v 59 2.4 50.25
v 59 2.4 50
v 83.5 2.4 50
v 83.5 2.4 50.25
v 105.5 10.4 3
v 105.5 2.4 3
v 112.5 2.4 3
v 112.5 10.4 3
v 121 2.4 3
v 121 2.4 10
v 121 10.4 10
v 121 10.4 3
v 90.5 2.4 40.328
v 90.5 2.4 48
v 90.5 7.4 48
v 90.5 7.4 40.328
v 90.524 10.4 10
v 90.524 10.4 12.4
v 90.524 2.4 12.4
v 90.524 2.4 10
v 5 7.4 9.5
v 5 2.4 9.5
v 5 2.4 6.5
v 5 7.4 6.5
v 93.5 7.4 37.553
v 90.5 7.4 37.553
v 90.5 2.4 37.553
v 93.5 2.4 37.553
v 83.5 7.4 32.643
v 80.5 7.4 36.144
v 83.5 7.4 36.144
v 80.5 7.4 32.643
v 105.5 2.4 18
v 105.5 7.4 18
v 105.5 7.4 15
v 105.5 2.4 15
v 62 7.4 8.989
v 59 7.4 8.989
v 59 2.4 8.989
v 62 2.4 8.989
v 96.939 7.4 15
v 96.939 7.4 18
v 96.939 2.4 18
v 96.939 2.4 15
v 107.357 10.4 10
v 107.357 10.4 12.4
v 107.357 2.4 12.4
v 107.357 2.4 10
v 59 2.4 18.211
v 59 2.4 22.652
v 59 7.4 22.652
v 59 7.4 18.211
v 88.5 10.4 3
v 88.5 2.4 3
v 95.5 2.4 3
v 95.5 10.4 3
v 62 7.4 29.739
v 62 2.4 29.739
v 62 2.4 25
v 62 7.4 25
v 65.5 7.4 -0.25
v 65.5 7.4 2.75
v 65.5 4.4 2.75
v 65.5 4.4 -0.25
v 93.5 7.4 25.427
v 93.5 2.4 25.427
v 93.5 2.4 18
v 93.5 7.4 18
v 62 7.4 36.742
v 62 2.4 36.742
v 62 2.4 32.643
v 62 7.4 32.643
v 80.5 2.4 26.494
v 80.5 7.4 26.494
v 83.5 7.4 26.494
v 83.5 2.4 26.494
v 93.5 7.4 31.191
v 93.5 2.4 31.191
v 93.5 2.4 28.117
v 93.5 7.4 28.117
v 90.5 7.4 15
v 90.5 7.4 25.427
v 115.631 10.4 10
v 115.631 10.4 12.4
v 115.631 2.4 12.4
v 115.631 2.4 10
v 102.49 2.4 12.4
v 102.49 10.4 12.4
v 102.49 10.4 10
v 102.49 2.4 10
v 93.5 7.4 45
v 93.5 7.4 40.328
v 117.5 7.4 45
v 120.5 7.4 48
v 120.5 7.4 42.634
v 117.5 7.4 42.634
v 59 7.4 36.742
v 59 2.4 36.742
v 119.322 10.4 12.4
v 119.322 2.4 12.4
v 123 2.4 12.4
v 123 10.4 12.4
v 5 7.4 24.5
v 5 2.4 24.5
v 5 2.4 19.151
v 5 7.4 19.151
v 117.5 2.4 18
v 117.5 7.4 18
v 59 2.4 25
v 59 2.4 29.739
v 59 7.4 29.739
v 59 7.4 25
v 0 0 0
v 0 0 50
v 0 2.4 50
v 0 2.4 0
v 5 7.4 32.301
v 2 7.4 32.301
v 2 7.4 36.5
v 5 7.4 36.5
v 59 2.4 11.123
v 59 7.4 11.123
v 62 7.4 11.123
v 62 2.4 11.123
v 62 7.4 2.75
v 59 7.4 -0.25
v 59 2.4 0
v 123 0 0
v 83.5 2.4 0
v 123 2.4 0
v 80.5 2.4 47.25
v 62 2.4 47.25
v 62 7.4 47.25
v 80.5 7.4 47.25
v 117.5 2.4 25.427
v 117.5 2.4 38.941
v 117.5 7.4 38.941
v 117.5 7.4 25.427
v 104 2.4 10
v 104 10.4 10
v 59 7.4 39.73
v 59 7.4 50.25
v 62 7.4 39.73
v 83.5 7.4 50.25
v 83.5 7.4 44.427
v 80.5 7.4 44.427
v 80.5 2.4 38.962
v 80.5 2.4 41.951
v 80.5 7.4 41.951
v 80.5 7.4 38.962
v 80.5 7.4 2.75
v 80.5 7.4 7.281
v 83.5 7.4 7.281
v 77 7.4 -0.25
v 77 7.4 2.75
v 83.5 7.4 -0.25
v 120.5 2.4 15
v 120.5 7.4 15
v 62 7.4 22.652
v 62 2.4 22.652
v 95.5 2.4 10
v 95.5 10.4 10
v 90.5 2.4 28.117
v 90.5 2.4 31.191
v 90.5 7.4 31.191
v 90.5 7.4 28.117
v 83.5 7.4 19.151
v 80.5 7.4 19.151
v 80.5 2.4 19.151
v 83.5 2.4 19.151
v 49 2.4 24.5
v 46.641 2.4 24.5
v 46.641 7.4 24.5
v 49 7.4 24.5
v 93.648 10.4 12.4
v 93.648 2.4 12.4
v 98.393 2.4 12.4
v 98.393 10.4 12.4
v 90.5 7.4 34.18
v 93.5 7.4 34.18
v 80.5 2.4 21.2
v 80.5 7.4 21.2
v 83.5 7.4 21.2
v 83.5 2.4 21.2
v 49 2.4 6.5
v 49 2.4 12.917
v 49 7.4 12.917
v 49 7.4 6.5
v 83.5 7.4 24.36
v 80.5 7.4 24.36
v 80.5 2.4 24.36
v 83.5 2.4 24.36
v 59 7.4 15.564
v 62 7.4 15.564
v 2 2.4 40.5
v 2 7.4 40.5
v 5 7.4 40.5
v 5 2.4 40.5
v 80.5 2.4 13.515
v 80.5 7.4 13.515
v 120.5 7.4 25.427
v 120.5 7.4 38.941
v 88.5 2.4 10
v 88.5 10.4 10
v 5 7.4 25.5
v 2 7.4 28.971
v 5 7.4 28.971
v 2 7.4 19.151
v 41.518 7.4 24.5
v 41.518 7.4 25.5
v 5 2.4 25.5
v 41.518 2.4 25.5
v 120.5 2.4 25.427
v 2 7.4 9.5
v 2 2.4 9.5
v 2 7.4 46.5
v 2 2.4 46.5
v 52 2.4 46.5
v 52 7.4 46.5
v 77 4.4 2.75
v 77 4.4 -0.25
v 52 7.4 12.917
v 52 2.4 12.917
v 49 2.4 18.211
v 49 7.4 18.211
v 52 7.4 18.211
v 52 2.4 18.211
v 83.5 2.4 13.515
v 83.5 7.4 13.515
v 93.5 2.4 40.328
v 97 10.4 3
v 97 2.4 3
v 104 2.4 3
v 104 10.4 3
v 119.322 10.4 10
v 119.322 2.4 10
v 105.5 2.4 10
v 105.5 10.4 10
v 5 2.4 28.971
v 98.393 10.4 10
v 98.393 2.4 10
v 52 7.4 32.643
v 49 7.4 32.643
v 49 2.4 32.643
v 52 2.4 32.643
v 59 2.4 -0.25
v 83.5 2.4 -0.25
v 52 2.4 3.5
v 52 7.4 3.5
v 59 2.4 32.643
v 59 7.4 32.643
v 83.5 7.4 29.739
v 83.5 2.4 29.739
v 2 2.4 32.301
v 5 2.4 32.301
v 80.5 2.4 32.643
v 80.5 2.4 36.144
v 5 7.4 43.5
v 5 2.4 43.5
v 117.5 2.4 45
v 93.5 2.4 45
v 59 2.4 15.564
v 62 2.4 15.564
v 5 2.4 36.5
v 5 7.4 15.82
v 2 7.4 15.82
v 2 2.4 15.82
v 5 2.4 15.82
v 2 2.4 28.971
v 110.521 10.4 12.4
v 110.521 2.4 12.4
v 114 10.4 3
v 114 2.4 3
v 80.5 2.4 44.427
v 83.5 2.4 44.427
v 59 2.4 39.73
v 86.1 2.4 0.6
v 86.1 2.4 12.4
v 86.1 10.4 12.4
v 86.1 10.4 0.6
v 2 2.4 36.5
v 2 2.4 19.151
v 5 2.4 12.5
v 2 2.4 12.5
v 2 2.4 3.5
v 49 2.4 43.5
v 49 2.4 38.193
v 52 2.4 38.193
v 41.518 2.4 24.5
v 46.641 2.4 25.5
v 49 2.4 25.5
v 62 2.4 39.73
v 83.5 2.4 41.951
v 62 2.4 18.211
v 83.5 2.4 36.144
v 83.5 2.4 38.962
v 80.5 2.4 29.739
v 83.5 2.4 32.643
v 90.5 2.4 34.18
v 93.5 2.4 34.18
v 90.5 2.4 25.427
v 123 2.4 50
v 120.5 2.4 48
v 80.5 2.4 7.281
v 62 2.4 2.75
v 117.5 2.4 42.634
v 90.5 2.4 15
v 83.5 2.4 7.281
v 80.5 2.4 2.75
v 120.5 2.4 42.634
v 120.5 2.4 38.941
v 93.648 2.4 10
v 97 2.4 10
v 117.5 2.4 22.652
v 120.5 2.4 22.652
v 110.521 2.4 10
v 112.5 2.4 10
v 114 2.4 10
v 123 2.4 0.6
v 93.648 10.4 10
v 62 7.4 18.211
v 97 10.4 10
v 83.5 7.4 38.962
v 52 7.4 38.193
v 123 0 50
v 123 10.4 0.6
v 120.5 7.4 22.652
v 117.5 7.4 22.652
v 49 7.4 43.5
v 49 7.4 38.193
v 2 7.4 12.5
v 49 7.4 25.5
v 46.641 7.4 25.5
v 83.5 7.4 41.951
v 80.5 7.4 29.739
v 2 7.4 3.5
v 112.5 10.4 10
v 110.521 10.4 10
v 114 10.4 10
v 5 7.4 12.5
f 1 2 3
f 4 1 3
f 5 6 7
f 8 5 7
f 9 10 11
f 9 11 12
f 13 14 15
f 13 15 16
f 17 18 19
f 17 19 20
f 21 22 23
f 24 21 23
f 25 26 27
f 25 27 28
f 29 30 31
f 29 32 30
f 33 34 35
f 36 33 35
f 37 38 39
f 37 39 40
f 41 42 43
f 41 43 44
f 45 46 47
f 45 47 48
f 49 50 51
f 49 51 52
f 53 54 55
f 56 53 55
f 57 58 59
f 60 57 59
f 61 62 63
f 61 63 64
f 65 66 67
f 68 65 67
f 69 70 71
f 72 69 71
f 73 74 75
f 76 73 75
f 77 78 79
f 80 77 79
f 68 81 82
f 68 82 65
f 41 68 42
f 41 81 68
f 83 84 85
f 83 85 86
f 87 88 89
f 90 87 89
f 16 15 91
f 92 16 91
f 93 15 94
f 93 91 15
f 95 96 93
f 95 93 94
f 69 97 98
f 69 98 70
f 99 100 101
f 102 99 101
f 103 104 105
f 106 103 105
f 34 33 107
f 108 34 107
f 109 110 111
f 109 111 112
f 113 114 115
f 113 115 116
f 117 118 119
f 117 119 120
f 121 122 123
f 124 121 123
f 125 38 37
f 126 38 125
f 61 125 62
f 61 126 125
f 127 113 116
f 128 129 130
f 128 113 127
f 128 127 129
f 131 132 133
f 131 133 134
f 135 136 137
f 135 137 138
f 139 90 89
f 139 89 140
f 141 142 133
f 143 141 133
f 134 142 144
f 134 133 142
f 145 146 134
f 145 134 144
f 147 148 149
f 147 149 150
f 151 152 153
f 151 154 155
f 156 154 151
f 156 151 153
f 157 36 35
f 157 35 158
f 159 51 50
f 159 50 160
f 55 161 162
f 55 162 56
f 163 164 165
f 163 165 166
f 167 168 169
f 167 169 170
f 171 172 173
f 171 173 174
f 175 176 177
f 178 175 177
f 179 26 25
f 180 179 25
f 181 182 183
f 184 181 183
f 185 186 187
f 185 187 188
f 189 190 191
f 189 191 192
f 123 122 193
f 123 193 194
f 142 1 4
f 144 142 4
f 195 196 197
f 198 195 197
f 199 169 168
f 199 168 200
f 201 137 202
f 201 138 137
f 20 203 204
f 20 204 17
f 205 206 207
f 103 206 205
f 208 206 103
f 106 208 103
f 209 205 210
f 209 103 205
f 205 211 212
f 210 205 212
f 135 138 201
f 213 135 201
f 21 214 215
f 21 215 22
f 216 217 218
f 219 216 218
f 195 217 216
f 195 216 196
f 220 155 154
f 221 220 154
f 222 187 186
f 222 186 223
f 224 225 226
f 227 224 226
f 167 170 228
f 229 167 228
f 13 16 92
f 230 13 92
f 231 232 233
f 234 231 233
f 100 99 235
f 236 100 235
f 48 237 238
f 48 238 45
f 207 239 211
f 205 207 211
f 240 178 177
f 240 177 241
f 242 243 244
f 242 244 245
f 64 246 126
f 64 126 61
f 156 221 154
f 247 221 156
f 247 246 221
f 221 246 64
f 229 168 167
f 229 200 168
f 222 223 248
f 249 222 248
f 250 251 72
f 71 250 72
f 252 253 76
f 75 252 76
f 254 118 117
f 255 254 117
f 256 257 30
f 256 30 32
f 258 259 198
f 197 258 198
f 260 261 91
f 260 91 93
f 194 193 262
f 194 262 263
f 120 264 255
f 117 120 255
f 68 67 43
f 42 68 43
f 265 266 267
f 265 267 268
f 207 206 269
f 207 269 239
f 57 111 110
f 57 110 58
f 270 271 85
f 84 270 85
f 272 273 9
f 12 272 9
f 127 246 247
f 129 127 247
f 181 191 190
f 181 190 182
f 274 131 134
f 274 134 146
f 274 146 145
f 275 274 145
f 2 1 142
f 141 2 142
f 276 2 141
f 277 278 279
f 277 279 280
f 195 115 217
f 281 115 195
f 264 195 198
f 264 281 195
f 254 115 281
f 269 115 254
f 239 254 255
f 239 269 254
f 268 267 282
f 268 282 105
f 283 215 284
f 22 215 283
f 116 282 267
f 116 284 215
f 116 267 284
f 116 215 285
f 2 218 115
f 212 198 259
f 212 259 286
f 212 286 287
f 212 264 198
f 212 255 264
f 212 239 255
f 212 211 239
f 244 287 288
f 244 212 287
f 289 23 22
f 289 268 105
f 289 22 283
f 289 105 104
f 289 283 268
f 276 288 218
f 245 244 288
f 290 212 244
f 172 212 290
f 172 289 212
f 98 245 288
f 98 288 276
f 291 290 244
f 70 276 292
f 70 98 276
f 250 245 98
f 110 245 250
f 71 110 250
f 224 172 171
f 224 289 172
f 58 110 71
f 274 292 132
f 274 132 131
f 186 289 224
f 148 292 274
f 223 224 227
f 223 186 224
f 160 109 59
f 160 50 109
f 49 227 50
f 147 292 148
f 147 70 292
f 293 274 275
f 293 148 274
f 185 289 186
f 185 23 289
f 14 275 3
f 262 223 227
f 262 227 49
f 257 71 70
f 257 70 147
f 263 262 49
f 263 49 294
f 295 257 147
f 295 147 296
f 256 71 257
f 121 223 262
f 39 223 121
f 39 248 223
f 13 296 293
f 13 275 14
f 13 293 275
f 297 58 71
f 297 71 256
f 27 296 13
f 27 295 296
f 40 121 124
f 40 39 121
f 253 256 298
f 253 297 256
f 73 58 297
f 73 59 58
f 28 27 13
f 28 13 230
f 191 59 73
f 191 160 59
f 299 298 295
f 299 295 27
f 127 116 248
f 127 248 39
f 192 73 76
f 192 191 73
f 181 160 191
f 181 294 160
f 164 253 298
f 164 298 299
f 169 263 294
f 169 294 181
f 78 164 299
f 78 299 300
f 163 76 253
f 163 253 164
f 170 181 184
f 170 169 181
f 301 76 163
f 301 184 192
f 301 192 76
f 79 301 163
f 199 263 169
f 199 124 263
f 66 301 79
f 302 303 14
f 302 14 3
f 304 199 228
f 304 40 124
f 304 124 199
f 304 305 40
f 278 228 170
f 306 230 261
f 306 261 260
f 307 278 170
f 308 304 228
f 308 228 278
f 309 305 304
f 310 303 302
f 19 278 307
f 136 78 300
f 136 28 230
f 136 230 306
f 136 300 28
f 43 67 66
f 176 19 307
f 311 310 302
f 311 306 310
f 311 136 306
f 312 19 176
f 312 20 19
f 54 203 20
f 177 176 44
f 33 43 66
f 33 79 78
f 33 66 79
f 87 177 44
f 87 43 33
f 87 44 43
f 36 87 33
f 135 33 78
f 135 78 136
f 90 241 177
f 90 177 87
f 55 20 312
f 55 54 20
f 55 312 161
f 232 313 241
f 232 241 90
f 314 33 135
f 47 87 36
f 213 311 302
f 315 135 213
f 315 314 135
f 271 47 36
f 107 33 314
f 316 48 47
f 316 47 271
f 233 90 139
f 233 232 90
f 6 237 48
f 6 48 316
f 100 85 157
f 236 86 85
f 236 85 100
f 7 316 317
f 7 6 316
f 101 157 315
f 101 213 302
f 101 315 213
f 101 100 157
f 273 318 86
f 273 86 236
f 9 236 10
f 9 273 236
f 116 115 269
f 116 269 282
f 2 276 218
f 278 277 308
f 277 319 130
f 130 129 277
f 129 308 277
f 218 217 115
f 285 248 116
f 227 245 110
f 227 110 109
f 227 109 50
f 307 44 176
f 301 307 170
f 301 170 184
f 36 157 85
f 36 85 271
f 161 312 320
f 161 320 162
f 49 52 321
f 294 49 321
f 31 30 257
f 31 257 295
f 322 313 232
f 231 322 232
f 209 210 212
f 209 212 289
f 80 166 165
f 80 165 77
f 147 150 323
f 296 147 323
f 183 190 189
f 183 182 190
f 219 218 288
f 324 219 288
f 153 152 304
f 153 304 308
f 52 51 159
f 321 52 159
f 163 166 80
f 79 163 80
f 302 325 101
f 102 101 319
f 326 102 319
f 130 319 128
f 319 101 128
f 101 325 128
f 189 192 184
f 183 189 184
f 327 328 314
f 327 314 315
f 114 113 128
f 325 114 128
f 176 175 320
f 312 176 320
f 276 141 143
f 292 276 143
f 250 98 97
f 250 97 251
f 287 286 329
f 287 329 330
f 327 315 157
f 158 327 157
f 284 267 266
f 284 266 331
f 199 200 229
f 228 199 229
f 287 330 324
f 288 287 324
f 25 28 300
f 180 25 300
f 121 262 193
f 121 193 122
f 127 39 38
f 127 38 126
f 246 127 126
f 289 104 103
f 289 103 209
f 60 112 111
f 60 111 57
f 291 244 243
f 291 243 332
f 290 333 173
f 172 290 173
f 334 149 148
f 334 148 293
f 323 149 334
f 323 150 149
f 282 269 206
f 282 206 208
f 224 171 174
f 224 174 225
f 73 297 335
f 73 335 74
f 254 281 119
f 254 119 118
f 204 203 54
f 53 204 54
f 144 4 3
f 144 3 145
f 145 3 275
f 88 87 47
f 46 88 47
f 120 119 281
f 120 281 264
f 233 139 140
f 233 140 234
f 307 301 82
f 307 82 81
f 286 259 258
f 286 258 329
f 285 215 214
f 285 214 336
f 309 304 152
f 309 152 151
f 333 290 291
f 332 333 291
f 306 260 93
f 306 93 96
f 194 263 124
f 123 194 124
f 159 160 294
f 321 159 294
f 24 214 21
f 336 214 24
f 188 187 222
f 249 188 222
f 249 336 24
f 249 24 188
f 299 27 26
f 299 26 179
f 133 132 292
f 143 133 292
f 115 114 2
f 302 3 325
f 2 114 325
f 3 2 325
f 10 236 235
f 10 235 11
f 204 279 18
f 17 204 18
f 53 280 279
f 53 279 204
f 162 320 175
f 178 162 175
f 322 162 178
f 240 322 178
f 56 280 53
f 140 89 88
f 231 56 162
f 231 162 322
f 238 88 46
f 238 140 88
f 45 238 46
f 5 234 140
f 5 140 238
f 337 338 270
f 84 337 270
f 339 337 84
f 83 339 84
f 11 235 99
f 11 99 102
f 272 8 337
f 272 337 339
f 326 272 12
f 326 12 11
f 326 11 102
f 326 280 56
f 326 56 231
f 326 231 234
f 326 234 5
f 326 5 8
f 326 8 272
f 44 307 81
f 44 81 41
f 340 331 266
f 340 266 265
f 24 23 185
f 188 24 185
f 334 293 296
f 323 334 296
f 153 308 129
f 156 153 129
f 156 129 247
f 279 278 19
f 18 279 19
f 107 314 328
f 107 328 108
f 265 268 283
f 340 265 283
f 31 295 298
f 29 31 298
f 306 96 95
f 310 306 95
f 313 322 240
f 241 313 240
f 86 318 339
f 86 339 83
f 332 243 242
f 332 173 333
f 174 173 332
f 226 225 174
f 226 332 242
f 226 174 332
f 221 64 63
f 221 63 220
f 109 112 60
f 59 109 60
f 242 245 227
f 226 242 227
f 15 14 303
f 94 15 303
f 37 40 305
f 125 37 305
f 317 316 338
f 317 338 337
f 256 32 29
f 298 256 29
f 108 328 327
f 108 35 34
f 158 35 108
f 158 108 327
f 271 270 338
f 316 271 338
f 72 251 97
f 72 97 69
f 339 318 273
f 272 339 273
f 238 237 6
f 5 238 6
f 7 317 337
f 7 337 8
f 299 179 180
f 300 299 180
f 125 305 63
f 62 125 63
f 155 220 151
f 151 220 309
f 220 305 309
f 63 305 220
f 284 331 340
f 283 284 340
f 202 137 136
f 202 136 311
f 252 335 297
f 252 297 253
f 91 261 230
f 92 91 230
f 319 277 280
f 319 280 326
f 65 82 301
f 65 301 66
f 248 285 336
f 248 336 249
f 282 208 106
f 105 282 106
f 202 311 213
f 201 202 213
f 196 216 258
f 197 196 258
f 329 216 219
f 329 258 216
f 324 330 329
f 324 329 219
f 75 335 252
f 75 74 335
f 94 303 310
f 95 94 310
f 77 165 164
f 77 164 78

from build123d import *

# Parameters (mm, degrees)
SKETCH1_W           = 123
SKETCH1_H           = 50
BOSS_EXTRUDE1_DEPTH = 2.4
SKETCH2_W           = 50
SKETCH2_H           = 43
SKETCH2_W_2         = 44
SKETCH2_H_2         = 18
BOSS_EXTRUDE2_DEPTH = 5
SKETCH3_W           = 24.5
SKETCH3_H           = 50.5
SKETCH3_W_2         = 18.5
SKETCH3_H_2         = 44.5
BOSS_EXTRUDE3_DEPTH = 5
SKETCH4_W           = 11.5
SKETCH4_H           = 3
CUT_EXTRUDE2_DEPTH  = 3
SKETCH5_W           = 30
SKETCH5_H           = 33
SKETCH5_W_2         = 24
SKETCH5_H_2         = 27
BOSS_EXTRUDE5_DEPTH = 5
SKETCH6_W           = 36.9
SKETCH6_H           = 11.8
SKETCH6_W_2         = 7
SKETCH6_H_2         = 7
BOSS_EXTRUDE6_DEPTH = 8
SKETCH7_W           = 5.123641681
SKETCH7_H           = 1
CUT_EXTRUDE3_DEPTH  = 5
SKETCH8_W           = 3
SKETCH8_H           = 5.294429738
SKETCH8_H_2         = 5.550611822
SKETCH8_H_3         = 2.134850701
SKETCH8_H_4         = 2.647214869
SKETCH8_H_5         = 2.348335771
SKETCH8_H_6         = 2.903396953
SKETCH8_H_7         = 2.988790981
SKETCH8_H_8         = 6.233764046
SKETCH8_H_9         = 2.049456673
SKETCH8_H_10        = 2.1348507
SKETCH8_H_11        = 2.818002924
SKETCH8_H_12        = 2.476426813
SKETCH8_H_13        = 2.689911883
SKETCH8_H_14        = 2.775305911
SKETCH8_H_15        = 3.693291713
SKETCH8_W_2         = 8.561478369
SKETCH8_H_16        = 3
CUT_EXTRUDE4_DEPTH  = 5
SKETCH9_W           = 3.123120747
SKETCH9_H           = 2.4
SKETCH9_W_2         = 4.09656098
SKETCH9_W_3         = 3.163680757
SKETCH9_W_4         = 3.690960883
CUT_EXTRUDE5_DEPTH  = 8
SKETCH10_W          = 3
SKETCH10_H          = 3
SKETCH10_H_2        = 3.330367093
SKETCH10_H_3        = 4
CUT_EXTRUDE6_DEPTH  = 5


with BuildPart() as part:
    # Sketch1 → Boss-Extrude1 (new body)
    with BuildSketch(Plane(origin=(0, 0, 0), x_dir=(1, 0, 0), z_dir=(0, 1, 0))):
        with Locations((61.5, -25)):
            Rectangle(SKETCH1_W, SKETCH1_H)
    extrude(amount=BOSS_EXTRUDE1_DEPTH)

    # Sketch2 → Boss-Extrude2 (add)
    with BuildSketch(Plane(origin=(0, 2.4, 0), x_dir=(1, 0, 0), z_dir=(0, 1, 0))):
        with Locations((27, -25)):
            Rectangle(SKETCH2_W, SKETCH2_H)
        with Locations((27, -15.5)):
            Rectangle(SKETCH2_W_2, SKETCH2_H_2, mode=Mode.SUBTRACT)
        with Locations((27, -34.5)):
            Rectangle(SKETCH2_W_2, SKETCH2_H_2, mode=Mode.SUBTRACT)
    extrude(amount=BOSS_EXTRUDE2_DEPTH)

    # Sketch3 → Boss-Extrude3 (add)
    with BuildSketch(Plane(origin=(0, 2.4, 0), x_dir=(1, 0, 0), z_dir=(0, 1, 0))):
        with Locations((71.25, -25)):
            Rectangle(SKETCH3_W, SKETCH3_H)
        with Locations((71.25, -25)):
            Rectangle(SKETCH3_W_2, SKETCH3_H_2, mode=Mode.SUBTRACT)
    extrude(amount=BOSS_EXTRUDE3_DEPTH)

    # Sketch4 → Cut-Extrude2 (cut)
    with BuildSketch(Plane(origin=(0, 7.4, 0), x_dir=(1, 0, 0), z_dir=(0, 1, 0))):
        with Locations((71.25, -1.25)):
            Rectangle(SKETCH4_W, SKETCH4_H)
    extrude(amount=-CUT_EXTRUDE2_DEPTH, mode=Mode.SUBTRACT)

    # Sketch5 → Boss-Extrude5 (add)
    with BuildSketch(Plane(origin=(0, 2.4, 0), x_dir=(1, 0, 0), z_dir=(0, 1, 0))):
        with Locations((105.5, -31.5)):
            Rectangle(SKETCH5_W, SKETCH5_H)
        with Locations((105.5, -31.5)):
            Rectangle(SKETCH5_W_2, SKETCH5_H_2, mode=Mode.SUBTRACT)
    extrude(amount=BOSS_EXTRUDE5_DEPTH)

    # Sketch6 → Boss-Extrude6 (add)
    with BuildSketch(Plane(origin=(0, 2.4, 0), x_dir=(1, 0, 0), z_dir=(0, 1, 0))):
        with Locations((104.55, -6.5)):
            Rectangle(SKETCH6_W, SKETCH6_H)
        with Locations((92, -6.5)):
            Rectangle(SKETCH6_W_2, SKETCH6_H_2, mode=Mode.SUBTRACT)
        with Locations((100.5, -6.5)):
            Rectangle(SKETCH6_W_2, SKETCH6_H_2, mode=Mode.SUBTRACT)
        with Locations((109, -6.5)):
            Rectangle(SKETCH6_W_2, SKETCH6_H_2, mode=Mode.SUBTRACT)
        with Locations((117.5, -6.5)):
            Rectangle(SKETCH6_W_2, SKETCH6_H_2, mode=Mode.SUBTRACT)
    extrude(amount=BOSS_EXTRUDE6_DEPTH)

    # Sketch7 → Cut-Extrude3 (cut)
    with BuildSketch(Plane(origin=(0, 7.4, 0), x_dir=(1, 0, 0), z_dir=(0, 1, 0))):
        with Locations((44.079618283, -25)):
            Rectangle(SKETCH7_W, SKETCH7_H)
    extrude(amount=-CUT_EXTRUDE3_DEPTH, mode=Mode.SUBTRACT)

    # Sketch8 → Cut-Extrude4 (cut)
    with BuildSketch(Plane(origin=(0, 7.4, 0), x_dir=(1, 0, 0), z_dir=(0, 1, 0))):
        with Locations((50.5, -15.563959903)):
            Rectangle(SKETCH8_W, SKETCH8_H)
        with Locations((50.5, -35.418071419)):
            Rectangle(SKETCH8_W, SKETCH8_H_2)
        with Locations((60.5, -10.056045096)):
            Rectangle(SKETCH8_W, SKETCH8_H_3)
        with Locations((60.5, -16.887567338)):
            Rectangle(SKETCH8_W, SKETCH8_H_4)
        with Locations((60.5, -23.825832115)):
            Rectangle(SKETCH8_W, SKETCH8_H_5)
        with Locations((60.5, -31.191067032)):
            Rectangle(SKETCH8_W, SKETCH8_H_6)
        with Locations((60.5, -38.236074344)):
            Rectangle(SKETCH8_W, SKETCH8_H_7)
        with Locations((82, -10.397621207)):
            Rectangle(SKETCH8_W, SKETCH8_H_8)
        with Locations((82, -20.175237417)):
            Rectangle(SKETCH8_W, SKETCH8_H_9)
        with Locations((82, -25.42697014)):
            Rectangle(SKETCH8_W, SKETCH8_H_10)
        with Locations((82, -31.191067032)):
            Rectangle(SKETCH8_W, SKETCH8_H_6)
        with Locations((82, -37.55292212)):
            Rectangle(SKETCH8_W, SKETCH8_H_11)
        with Locations((82, -43.188927969)):
            Rectangle(SKETCH8_W, SKETCH8_H_12)
        with Locations((92, -26.771926082)):
            Rectangle(SKETCH8_W, SKETCH8_H_13)
        with Locations((92, -32.685462523)):
            Rectangle(SKETCH8_W, SKETCH8_H_7)
        with Locations((92, -38.940575076)):
            Rectangle(SKETCH8_W, SKETCH8_H_14)
        with Locations((119, -40.787220932)):
            Rectangle(SKETCH8_W, SKETCH8_H_15)
        with Locations((119, -24.039317184)):
            Rectangle(SKETCH8_W, SKETCH8_H_14)
        with Locations((101.219260816, -16.5)):
            Rectangle(SKETCH8_W_2, SKETCH8_H_16)
    extrude(amount=-CUT_EXTRUDE4_DEPTH, mode=Mode.SUBTRACT)

    # Sketch9 → Cut-Extrude5 (cut)
    with BuildSketch(Plane(origin=(0, 10.4, 0), x_dir=(1, 0, 0), z_dir=(0, 1, 0))):
        with Locations((92.086007163, -11.2)):
            Rectangle(SKETCH9_W, SKETCH9_H)
        with Locations((100.441369161, -11.2)):
            Rectangle(SKETCH9_W_2, SKETCH9_H)
        with Locations((108.938691194, -11.2)):
            Rectangle(SKETCH9_W_3, SKETCH9_H)
        with Locations((117.476573236, -11.2)):
            Rectangle(SKETCH9_W_4, SKETCH9_H)
    extrude(amount=-CUT_EXTRUDE5_DEPTH, mode=Mode.SUBTRACT)

    # Sketch10 → Cut-Extrude6 (cut)
    with BuildSketch(Plane(origin=(0, 7.4, 0), x_dir=(1, 0, 0), z_dir=(0, 1, 0))):
        with Locations((3.5, -11)):
            Rectangle(SKETCH10_W, SKETCH10_H)
        with Locations((3.5, -17.485325534)):
            Rectangle(SKETCH10_W, SKETCH10_H_2)
        with Locations((3.5, -30.63600585)):
            Rectangle(SKETCH10_W, SKETCH10_H_2)
        with Locations((3.5, -38.5)):
            Rectangle(SKETCH10_W, SKETCH10_H_3)
    extrude(amount=-CUT_EXTRUDE6_DEPTH, mode=Mode.SUBTRACT)


solid = part.part
